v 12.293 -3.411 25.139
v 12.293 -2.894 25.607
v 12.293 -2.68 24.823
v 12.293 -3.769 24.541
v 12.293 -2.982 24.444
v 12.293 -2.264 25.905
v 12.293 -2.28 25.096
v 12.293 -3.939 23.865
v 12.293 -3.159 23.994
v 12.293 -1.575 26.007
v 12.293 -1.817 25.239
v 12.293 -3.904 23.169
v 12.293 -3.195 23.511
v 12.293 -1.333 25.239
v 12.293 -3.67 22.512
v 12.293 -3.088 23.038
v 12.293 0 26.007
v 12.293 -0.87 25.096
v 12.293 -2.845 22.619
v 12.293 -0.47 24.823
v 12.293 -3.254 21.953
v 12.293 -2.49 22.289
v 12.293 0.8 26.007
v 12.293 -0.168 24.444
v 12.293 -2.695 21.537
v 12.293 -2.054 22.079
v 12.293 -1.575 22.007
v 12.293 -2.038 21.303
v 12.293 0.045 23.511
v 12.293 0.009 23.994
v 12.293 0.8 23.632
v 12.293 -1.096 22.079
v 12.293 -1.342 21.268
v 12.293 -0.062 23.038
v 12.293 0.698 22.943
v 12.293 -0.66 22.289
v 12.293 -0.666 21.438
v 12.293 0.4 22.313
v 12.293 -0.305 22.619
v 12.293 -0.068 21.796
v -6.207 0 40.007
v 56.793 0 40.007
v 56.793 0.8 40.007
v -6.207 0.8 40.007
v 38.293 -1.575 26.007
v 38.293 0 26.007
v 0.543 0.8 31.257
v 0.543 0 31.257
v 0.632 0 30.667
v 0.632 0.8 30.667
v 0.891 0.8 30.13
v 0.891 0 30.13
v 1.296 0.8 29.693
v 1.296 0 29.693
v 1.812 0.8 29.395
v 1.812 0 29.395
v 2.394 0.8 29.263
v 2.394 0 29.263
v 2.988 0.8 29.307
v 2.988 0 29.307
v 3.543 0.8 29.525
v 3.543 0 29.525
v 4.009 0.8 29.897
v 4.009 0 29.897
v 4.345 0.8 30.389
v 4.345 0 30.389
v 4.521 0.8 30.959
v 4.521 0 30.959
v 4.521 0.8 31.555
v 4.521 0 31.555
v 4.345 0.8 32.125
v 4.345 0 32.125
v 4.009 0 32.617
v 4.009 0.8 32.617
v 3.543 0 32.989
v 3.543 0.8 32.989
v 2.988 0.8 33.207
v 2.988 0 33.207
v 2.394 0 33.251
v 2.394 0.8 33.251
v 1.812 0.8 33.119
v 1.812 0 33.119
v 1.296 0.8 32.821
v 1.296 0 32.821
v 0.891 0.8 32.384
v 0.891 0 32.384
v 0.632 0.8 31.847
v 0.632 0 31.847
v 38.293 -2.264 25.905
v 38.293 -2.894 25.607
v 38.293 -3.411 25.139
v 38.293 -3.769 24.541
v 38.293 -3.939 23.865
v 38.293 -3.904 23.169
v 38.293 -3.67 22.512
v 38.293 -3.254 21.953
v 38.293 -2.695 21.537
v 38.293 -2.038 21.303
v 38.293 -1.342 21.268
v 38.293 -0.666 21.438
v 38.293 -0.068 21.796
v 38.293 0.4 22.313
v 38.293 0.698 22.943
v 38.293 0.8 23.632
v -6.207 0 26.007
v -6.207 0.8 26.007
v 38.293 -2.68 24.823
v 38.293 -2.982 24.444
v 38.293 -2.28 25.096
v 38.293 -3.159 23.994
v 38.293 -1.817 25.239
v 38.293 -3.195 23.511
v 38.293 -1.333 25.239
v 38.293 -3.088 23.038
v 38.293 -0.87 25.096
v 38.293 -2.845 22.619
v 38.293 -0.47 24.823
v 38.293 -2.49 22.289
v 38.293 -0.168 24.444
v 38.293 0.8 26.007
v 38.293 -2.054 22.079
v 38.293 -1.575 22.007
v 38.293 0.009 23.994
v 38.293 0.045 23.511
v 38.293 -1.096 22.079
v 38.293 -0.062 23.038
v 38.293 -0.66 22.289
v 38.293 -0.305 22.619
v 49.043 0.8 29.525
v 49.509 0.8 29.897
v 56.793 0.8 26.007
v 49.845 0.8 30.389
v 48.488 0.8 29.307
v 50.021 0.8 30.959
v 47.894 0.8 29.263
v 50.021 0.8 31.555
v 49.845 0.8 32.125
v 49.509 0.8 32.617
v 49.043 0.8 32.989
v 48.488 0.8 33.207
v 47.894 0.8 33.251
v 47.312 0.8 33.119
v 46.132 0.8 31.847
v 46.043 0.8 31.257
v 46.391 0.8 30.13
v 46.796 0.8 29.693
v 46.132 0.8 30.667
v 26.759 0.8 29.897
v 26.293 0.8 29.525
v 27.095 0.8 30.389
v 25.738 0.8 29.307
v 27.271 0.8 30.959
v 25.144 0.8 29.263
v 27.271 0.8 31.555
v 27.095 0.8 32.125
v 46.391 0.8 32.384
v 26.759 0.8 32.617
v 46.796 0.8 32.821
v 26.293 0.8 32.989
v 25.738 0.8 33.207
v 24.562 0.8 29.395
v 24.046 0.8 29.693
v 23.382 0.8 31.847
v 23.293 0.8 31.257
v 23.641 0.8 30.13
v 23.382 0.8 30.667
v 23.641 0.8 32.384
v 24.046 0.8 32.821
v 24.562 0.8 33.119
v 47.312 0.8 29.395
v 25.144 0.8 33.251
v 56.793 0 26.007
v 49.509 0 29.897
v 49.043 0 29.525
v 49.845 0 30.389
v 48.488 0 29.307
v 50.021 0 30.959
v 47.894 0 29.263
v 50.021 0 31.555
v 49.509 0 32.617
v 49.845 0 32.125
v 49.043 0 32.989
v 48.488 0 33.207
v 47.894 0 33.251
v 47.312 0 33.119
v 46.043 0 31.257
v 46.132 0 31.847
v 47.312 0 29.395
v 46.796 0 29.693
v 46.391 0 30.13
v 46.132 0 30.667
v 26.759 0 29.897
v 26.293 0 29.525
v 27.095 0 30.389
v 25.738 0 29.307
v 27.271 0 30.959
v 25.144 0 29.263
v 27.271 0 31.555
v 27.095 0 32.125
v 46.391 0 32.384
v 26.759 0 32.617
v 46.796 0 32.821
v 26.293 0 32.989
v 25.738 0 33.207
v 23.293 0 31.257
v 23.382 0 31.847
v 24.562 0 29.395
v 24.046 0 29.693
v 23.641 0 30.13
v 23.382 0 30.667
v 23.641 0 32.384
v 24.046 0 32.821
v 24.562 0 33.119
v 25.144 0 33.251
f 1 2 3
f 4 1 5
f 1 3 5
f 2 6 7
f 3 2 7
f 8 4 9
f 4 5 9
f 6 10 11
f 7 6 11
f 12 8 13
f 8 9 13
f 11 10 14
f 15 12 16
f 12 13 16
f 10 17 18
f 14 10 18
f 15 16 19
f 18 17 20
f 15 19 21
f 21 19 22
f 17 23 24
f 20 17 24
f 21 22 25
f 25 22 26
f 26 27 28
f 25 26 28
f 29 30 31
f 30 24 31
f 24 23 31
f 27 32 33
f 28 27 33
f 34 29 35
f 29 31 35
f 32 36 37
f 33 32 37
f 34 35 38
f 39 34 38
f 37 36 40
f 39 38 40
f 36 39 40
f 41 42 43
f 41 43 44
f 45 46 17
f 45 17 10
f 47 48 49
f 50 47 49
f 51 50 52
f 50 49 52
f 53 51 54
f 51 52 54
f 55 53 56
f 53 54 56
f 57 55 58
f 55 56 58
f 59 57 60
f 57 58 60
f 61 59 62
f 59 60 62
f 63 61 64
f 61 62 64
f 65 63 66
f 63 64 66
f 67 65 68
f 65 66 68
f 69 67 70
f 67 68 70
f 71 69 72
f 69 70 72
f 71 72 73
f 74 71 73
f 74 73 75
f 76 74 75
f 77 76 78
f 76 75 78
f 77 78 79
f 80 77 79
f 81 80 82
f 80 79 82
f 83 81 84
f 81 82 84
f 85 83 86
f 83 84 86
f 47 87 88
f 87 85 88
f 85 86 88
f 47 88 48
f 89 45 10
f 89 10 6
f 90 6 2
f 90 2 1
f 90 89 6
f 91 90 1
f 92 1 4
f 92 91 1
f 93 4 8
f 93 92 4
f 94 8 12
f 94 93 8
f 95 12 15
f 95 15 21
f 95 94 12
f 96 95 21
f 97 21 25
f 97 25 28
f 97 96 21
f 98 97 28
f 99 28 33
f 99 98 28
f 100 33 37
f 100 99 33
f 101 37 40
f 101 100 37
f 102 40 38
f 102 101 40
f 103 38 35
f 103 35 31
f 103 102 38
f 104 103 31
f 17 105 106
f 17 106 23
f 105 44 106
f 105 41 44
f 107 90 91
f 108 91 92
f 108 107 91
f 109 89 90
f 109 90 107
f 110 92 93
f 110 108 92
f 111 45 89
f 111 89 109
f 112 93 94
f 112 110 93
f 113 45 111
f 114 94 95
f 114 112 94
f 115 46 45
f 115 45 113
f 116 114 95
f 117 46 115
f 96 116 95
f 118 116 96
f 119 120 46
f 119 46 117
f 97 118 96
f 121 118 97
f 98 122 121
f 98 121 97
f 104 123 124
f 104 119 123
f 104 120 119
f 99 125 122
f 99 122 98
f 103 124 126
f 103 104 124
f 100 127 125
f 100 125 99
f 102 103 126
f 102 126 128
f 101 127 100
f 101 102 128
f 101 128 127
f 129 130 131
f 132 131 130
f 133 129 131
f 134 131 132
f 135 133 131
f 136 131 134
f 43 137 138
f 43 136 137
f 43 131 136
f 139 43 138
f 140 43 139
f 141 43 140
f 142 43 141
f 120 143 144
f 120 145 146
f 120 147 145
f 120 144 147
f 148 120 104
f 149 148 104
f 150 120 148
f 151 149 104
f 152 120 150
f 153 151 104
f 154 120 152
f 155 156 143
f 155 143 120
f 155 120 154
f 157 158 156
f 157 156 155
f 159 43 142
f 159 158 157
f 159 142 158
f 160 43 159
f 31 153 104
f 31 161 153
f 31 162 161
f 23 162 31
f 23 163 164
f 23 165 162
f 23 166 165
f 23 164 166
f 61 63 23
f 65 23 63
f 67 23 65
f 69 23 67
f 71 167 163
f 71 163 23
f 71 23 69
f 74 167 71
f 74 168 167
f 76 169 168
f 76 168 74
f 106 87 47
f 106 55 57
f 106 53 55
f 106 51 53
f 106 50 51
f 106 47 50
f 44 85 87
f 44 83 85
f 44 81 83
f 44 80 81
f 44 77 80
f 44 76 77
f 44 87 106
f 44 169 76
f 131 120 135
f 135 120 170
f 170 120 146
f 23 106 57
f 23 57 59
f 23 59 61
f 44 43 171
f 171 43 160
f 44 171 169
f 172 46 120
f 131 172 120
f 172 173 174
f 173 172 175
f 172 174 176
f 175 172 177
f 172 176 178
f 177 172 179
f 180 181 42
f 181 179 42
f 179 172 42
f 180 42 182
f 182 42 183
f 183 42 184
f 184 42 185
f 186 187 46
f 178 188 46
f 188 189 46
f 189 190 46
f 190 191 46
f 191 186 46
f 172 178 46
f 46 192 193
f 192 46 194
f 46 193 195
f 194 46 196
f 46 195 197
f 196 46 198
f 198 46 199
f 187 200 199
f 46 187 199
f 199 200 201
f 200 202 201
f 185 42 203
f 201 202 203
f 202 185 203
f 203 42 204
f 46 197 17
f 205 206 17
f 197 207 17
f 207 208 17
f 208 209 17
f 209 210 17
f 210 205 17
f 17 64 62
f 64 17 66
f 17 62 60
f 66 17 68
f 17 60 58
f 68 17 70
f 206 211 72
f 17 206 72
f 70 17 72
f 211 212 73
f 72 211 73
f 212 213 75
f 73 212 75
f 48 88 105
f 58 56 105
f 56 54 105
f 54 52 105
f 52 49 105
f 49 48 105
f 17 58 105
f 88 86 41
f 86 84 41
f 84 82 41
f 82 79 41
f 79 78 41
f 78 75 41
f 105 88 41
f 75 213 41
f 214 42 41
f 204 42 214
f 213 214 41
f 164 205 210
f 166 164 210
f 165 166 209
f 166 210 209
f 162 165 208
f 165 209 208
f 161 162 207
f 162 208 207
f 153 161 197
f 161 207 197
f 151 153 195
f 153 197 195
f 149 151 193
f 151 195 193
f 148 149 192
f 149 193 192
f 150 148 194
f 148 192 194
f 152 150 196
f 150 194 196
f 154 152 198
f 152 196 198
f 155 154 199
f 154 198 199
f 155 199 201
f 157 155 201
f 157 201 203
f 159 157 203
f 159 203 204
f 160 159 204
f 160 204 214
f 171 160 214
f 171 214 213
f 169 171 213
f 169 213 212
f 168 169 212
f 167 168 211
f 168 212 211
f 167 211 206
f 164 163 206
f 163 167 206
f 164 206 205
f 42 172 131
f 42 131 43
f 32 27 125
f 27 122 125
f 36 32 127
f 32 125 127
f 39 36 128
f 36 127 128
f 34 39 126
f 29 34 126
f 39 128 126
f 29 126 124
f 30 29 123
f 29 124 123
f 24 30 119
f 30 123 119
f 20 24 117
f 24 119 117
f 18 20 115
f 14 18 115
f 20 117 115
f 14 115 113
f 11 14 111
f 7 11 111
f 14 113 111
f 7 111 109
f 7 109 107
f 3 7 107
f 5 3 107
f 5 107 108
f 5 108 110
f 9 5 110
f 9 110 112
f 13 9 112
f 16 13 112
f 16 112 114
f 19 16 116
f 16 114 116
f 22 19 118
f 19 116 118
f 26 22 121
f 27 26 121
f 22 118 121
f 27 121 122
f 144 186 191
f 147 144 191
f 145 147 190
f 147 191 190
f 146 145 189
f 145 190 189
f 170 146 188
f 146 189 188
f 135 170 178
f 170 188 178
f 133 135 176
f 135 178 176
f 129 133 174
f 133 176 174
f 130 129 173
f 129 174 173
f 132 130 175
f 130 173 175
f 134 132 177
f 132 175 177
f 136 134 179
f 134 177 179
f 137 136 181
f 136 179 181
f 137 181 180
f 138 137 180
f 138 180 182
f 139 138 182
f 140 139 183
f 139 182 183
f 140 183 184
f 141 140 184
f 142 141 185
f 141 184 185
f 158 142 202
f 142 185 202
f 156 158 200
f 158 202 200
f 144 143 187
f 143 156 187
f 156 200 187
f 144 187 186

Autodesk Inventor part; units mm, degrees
ref_plane "YZ Plane" through (0, 0, 0) normal (1, 0, 0) x (0, 1, 0)
ref_plane "XZ Plane" through (0, 0, 0) normal (0, 1, 0) x (-1, 0, 0)
ref_plane "XY Plane" through (0, 0, 0) normal (0, 0, 1) x (1, 0, 0)
sketch "Boceto1" plane through (0, 0, 0) normal (0, 1, 0) x (-1, 0, 0)
  line L0 (6.207, 40.007) -> (6.207, 26.007)
  line L1 (6.207, 26.007) -> (-56.793, 26.007)
  line L2 (-56.793, 26.007) -> (-56.793, 40.007)
  line L3 (-56.793, 40.007) -> (6.207, 40.007)
  circle A0 centre (-25.293, 31.257) radius 2
  circle A1 centre (-2.543, 31.257) radius 2
  circle A2 centre (-48.043, 31.257) radius 2
  point P0 (0, 0)
  point P1 (0, 0)
  dimension "d0" = 14
  dimension "d1" = 63
  dimension "d24" = 4
  dimension "d25" = 4
  dimension "d26" = 4
  dimension "d27" = 8.75
  dimension "d28" = 8.75
  dimension "d29" = 8.75
  dimension "d30" = 31.5
  dimension "d31" = 8.75
  dimension "d32" = 8.75
extrude "Extrusión1" add sketch "Boceto1" along normal blind 0.8
sketch "Boceto7" plane through (56.793, 0, 40.007) normal (1, 0, 0) x (0, 0, -1)
  circle A0 centre (16.375, -1.575) radius 2.375
  circle A1 centre (16.375, -1.575) radius 1.625
  line L0 (0, 0.8) -> (14, 0.8) projected
  line L1 (14, 0) -> (14, 0.8) projected
  line L2 (14, 0) -> (14, -1.575)
  line L3 (16.375, 0.8) -> (14, 0.8)
  line L4 (14, 0) -> (0, 0) projected
  line L5 (14, 0.8) -> (14, 0)
  point P0 (40.007, 0)
  dimension "d33" = 4.75
  dimension "d34" = 3.25
extrude "Extrusión6" add sketch "Boceto7" against normal blind 44.5
sketch "Boceto9" plane through (56.793, 0, 40.007) normal (1, 0, 0) x (0, 0, -1)
  circle A0 centre (16.375, -1.575) radius 1.625 projected
  circle A1 centre (16.375, -1.575) radius 2.375
  line L0 (14, 0.8) -> (16.375, 0.8) projected
  line L1 (16.375, 0.8) -> (14, 0.8)
  line L2 (14, -1.575) -> (14, 0) projected
  line L3 (14, 0.8) -> (14, -1.575)
  point P0 (40.007, 0)
extrude "Extrusión8" cut sketch "Boceto9" against normal blind 18.5 contours A0 | A1 | A1 L2 L3 L0
properties part number "Ala 2 Bisagra tipo Libro Chica"
